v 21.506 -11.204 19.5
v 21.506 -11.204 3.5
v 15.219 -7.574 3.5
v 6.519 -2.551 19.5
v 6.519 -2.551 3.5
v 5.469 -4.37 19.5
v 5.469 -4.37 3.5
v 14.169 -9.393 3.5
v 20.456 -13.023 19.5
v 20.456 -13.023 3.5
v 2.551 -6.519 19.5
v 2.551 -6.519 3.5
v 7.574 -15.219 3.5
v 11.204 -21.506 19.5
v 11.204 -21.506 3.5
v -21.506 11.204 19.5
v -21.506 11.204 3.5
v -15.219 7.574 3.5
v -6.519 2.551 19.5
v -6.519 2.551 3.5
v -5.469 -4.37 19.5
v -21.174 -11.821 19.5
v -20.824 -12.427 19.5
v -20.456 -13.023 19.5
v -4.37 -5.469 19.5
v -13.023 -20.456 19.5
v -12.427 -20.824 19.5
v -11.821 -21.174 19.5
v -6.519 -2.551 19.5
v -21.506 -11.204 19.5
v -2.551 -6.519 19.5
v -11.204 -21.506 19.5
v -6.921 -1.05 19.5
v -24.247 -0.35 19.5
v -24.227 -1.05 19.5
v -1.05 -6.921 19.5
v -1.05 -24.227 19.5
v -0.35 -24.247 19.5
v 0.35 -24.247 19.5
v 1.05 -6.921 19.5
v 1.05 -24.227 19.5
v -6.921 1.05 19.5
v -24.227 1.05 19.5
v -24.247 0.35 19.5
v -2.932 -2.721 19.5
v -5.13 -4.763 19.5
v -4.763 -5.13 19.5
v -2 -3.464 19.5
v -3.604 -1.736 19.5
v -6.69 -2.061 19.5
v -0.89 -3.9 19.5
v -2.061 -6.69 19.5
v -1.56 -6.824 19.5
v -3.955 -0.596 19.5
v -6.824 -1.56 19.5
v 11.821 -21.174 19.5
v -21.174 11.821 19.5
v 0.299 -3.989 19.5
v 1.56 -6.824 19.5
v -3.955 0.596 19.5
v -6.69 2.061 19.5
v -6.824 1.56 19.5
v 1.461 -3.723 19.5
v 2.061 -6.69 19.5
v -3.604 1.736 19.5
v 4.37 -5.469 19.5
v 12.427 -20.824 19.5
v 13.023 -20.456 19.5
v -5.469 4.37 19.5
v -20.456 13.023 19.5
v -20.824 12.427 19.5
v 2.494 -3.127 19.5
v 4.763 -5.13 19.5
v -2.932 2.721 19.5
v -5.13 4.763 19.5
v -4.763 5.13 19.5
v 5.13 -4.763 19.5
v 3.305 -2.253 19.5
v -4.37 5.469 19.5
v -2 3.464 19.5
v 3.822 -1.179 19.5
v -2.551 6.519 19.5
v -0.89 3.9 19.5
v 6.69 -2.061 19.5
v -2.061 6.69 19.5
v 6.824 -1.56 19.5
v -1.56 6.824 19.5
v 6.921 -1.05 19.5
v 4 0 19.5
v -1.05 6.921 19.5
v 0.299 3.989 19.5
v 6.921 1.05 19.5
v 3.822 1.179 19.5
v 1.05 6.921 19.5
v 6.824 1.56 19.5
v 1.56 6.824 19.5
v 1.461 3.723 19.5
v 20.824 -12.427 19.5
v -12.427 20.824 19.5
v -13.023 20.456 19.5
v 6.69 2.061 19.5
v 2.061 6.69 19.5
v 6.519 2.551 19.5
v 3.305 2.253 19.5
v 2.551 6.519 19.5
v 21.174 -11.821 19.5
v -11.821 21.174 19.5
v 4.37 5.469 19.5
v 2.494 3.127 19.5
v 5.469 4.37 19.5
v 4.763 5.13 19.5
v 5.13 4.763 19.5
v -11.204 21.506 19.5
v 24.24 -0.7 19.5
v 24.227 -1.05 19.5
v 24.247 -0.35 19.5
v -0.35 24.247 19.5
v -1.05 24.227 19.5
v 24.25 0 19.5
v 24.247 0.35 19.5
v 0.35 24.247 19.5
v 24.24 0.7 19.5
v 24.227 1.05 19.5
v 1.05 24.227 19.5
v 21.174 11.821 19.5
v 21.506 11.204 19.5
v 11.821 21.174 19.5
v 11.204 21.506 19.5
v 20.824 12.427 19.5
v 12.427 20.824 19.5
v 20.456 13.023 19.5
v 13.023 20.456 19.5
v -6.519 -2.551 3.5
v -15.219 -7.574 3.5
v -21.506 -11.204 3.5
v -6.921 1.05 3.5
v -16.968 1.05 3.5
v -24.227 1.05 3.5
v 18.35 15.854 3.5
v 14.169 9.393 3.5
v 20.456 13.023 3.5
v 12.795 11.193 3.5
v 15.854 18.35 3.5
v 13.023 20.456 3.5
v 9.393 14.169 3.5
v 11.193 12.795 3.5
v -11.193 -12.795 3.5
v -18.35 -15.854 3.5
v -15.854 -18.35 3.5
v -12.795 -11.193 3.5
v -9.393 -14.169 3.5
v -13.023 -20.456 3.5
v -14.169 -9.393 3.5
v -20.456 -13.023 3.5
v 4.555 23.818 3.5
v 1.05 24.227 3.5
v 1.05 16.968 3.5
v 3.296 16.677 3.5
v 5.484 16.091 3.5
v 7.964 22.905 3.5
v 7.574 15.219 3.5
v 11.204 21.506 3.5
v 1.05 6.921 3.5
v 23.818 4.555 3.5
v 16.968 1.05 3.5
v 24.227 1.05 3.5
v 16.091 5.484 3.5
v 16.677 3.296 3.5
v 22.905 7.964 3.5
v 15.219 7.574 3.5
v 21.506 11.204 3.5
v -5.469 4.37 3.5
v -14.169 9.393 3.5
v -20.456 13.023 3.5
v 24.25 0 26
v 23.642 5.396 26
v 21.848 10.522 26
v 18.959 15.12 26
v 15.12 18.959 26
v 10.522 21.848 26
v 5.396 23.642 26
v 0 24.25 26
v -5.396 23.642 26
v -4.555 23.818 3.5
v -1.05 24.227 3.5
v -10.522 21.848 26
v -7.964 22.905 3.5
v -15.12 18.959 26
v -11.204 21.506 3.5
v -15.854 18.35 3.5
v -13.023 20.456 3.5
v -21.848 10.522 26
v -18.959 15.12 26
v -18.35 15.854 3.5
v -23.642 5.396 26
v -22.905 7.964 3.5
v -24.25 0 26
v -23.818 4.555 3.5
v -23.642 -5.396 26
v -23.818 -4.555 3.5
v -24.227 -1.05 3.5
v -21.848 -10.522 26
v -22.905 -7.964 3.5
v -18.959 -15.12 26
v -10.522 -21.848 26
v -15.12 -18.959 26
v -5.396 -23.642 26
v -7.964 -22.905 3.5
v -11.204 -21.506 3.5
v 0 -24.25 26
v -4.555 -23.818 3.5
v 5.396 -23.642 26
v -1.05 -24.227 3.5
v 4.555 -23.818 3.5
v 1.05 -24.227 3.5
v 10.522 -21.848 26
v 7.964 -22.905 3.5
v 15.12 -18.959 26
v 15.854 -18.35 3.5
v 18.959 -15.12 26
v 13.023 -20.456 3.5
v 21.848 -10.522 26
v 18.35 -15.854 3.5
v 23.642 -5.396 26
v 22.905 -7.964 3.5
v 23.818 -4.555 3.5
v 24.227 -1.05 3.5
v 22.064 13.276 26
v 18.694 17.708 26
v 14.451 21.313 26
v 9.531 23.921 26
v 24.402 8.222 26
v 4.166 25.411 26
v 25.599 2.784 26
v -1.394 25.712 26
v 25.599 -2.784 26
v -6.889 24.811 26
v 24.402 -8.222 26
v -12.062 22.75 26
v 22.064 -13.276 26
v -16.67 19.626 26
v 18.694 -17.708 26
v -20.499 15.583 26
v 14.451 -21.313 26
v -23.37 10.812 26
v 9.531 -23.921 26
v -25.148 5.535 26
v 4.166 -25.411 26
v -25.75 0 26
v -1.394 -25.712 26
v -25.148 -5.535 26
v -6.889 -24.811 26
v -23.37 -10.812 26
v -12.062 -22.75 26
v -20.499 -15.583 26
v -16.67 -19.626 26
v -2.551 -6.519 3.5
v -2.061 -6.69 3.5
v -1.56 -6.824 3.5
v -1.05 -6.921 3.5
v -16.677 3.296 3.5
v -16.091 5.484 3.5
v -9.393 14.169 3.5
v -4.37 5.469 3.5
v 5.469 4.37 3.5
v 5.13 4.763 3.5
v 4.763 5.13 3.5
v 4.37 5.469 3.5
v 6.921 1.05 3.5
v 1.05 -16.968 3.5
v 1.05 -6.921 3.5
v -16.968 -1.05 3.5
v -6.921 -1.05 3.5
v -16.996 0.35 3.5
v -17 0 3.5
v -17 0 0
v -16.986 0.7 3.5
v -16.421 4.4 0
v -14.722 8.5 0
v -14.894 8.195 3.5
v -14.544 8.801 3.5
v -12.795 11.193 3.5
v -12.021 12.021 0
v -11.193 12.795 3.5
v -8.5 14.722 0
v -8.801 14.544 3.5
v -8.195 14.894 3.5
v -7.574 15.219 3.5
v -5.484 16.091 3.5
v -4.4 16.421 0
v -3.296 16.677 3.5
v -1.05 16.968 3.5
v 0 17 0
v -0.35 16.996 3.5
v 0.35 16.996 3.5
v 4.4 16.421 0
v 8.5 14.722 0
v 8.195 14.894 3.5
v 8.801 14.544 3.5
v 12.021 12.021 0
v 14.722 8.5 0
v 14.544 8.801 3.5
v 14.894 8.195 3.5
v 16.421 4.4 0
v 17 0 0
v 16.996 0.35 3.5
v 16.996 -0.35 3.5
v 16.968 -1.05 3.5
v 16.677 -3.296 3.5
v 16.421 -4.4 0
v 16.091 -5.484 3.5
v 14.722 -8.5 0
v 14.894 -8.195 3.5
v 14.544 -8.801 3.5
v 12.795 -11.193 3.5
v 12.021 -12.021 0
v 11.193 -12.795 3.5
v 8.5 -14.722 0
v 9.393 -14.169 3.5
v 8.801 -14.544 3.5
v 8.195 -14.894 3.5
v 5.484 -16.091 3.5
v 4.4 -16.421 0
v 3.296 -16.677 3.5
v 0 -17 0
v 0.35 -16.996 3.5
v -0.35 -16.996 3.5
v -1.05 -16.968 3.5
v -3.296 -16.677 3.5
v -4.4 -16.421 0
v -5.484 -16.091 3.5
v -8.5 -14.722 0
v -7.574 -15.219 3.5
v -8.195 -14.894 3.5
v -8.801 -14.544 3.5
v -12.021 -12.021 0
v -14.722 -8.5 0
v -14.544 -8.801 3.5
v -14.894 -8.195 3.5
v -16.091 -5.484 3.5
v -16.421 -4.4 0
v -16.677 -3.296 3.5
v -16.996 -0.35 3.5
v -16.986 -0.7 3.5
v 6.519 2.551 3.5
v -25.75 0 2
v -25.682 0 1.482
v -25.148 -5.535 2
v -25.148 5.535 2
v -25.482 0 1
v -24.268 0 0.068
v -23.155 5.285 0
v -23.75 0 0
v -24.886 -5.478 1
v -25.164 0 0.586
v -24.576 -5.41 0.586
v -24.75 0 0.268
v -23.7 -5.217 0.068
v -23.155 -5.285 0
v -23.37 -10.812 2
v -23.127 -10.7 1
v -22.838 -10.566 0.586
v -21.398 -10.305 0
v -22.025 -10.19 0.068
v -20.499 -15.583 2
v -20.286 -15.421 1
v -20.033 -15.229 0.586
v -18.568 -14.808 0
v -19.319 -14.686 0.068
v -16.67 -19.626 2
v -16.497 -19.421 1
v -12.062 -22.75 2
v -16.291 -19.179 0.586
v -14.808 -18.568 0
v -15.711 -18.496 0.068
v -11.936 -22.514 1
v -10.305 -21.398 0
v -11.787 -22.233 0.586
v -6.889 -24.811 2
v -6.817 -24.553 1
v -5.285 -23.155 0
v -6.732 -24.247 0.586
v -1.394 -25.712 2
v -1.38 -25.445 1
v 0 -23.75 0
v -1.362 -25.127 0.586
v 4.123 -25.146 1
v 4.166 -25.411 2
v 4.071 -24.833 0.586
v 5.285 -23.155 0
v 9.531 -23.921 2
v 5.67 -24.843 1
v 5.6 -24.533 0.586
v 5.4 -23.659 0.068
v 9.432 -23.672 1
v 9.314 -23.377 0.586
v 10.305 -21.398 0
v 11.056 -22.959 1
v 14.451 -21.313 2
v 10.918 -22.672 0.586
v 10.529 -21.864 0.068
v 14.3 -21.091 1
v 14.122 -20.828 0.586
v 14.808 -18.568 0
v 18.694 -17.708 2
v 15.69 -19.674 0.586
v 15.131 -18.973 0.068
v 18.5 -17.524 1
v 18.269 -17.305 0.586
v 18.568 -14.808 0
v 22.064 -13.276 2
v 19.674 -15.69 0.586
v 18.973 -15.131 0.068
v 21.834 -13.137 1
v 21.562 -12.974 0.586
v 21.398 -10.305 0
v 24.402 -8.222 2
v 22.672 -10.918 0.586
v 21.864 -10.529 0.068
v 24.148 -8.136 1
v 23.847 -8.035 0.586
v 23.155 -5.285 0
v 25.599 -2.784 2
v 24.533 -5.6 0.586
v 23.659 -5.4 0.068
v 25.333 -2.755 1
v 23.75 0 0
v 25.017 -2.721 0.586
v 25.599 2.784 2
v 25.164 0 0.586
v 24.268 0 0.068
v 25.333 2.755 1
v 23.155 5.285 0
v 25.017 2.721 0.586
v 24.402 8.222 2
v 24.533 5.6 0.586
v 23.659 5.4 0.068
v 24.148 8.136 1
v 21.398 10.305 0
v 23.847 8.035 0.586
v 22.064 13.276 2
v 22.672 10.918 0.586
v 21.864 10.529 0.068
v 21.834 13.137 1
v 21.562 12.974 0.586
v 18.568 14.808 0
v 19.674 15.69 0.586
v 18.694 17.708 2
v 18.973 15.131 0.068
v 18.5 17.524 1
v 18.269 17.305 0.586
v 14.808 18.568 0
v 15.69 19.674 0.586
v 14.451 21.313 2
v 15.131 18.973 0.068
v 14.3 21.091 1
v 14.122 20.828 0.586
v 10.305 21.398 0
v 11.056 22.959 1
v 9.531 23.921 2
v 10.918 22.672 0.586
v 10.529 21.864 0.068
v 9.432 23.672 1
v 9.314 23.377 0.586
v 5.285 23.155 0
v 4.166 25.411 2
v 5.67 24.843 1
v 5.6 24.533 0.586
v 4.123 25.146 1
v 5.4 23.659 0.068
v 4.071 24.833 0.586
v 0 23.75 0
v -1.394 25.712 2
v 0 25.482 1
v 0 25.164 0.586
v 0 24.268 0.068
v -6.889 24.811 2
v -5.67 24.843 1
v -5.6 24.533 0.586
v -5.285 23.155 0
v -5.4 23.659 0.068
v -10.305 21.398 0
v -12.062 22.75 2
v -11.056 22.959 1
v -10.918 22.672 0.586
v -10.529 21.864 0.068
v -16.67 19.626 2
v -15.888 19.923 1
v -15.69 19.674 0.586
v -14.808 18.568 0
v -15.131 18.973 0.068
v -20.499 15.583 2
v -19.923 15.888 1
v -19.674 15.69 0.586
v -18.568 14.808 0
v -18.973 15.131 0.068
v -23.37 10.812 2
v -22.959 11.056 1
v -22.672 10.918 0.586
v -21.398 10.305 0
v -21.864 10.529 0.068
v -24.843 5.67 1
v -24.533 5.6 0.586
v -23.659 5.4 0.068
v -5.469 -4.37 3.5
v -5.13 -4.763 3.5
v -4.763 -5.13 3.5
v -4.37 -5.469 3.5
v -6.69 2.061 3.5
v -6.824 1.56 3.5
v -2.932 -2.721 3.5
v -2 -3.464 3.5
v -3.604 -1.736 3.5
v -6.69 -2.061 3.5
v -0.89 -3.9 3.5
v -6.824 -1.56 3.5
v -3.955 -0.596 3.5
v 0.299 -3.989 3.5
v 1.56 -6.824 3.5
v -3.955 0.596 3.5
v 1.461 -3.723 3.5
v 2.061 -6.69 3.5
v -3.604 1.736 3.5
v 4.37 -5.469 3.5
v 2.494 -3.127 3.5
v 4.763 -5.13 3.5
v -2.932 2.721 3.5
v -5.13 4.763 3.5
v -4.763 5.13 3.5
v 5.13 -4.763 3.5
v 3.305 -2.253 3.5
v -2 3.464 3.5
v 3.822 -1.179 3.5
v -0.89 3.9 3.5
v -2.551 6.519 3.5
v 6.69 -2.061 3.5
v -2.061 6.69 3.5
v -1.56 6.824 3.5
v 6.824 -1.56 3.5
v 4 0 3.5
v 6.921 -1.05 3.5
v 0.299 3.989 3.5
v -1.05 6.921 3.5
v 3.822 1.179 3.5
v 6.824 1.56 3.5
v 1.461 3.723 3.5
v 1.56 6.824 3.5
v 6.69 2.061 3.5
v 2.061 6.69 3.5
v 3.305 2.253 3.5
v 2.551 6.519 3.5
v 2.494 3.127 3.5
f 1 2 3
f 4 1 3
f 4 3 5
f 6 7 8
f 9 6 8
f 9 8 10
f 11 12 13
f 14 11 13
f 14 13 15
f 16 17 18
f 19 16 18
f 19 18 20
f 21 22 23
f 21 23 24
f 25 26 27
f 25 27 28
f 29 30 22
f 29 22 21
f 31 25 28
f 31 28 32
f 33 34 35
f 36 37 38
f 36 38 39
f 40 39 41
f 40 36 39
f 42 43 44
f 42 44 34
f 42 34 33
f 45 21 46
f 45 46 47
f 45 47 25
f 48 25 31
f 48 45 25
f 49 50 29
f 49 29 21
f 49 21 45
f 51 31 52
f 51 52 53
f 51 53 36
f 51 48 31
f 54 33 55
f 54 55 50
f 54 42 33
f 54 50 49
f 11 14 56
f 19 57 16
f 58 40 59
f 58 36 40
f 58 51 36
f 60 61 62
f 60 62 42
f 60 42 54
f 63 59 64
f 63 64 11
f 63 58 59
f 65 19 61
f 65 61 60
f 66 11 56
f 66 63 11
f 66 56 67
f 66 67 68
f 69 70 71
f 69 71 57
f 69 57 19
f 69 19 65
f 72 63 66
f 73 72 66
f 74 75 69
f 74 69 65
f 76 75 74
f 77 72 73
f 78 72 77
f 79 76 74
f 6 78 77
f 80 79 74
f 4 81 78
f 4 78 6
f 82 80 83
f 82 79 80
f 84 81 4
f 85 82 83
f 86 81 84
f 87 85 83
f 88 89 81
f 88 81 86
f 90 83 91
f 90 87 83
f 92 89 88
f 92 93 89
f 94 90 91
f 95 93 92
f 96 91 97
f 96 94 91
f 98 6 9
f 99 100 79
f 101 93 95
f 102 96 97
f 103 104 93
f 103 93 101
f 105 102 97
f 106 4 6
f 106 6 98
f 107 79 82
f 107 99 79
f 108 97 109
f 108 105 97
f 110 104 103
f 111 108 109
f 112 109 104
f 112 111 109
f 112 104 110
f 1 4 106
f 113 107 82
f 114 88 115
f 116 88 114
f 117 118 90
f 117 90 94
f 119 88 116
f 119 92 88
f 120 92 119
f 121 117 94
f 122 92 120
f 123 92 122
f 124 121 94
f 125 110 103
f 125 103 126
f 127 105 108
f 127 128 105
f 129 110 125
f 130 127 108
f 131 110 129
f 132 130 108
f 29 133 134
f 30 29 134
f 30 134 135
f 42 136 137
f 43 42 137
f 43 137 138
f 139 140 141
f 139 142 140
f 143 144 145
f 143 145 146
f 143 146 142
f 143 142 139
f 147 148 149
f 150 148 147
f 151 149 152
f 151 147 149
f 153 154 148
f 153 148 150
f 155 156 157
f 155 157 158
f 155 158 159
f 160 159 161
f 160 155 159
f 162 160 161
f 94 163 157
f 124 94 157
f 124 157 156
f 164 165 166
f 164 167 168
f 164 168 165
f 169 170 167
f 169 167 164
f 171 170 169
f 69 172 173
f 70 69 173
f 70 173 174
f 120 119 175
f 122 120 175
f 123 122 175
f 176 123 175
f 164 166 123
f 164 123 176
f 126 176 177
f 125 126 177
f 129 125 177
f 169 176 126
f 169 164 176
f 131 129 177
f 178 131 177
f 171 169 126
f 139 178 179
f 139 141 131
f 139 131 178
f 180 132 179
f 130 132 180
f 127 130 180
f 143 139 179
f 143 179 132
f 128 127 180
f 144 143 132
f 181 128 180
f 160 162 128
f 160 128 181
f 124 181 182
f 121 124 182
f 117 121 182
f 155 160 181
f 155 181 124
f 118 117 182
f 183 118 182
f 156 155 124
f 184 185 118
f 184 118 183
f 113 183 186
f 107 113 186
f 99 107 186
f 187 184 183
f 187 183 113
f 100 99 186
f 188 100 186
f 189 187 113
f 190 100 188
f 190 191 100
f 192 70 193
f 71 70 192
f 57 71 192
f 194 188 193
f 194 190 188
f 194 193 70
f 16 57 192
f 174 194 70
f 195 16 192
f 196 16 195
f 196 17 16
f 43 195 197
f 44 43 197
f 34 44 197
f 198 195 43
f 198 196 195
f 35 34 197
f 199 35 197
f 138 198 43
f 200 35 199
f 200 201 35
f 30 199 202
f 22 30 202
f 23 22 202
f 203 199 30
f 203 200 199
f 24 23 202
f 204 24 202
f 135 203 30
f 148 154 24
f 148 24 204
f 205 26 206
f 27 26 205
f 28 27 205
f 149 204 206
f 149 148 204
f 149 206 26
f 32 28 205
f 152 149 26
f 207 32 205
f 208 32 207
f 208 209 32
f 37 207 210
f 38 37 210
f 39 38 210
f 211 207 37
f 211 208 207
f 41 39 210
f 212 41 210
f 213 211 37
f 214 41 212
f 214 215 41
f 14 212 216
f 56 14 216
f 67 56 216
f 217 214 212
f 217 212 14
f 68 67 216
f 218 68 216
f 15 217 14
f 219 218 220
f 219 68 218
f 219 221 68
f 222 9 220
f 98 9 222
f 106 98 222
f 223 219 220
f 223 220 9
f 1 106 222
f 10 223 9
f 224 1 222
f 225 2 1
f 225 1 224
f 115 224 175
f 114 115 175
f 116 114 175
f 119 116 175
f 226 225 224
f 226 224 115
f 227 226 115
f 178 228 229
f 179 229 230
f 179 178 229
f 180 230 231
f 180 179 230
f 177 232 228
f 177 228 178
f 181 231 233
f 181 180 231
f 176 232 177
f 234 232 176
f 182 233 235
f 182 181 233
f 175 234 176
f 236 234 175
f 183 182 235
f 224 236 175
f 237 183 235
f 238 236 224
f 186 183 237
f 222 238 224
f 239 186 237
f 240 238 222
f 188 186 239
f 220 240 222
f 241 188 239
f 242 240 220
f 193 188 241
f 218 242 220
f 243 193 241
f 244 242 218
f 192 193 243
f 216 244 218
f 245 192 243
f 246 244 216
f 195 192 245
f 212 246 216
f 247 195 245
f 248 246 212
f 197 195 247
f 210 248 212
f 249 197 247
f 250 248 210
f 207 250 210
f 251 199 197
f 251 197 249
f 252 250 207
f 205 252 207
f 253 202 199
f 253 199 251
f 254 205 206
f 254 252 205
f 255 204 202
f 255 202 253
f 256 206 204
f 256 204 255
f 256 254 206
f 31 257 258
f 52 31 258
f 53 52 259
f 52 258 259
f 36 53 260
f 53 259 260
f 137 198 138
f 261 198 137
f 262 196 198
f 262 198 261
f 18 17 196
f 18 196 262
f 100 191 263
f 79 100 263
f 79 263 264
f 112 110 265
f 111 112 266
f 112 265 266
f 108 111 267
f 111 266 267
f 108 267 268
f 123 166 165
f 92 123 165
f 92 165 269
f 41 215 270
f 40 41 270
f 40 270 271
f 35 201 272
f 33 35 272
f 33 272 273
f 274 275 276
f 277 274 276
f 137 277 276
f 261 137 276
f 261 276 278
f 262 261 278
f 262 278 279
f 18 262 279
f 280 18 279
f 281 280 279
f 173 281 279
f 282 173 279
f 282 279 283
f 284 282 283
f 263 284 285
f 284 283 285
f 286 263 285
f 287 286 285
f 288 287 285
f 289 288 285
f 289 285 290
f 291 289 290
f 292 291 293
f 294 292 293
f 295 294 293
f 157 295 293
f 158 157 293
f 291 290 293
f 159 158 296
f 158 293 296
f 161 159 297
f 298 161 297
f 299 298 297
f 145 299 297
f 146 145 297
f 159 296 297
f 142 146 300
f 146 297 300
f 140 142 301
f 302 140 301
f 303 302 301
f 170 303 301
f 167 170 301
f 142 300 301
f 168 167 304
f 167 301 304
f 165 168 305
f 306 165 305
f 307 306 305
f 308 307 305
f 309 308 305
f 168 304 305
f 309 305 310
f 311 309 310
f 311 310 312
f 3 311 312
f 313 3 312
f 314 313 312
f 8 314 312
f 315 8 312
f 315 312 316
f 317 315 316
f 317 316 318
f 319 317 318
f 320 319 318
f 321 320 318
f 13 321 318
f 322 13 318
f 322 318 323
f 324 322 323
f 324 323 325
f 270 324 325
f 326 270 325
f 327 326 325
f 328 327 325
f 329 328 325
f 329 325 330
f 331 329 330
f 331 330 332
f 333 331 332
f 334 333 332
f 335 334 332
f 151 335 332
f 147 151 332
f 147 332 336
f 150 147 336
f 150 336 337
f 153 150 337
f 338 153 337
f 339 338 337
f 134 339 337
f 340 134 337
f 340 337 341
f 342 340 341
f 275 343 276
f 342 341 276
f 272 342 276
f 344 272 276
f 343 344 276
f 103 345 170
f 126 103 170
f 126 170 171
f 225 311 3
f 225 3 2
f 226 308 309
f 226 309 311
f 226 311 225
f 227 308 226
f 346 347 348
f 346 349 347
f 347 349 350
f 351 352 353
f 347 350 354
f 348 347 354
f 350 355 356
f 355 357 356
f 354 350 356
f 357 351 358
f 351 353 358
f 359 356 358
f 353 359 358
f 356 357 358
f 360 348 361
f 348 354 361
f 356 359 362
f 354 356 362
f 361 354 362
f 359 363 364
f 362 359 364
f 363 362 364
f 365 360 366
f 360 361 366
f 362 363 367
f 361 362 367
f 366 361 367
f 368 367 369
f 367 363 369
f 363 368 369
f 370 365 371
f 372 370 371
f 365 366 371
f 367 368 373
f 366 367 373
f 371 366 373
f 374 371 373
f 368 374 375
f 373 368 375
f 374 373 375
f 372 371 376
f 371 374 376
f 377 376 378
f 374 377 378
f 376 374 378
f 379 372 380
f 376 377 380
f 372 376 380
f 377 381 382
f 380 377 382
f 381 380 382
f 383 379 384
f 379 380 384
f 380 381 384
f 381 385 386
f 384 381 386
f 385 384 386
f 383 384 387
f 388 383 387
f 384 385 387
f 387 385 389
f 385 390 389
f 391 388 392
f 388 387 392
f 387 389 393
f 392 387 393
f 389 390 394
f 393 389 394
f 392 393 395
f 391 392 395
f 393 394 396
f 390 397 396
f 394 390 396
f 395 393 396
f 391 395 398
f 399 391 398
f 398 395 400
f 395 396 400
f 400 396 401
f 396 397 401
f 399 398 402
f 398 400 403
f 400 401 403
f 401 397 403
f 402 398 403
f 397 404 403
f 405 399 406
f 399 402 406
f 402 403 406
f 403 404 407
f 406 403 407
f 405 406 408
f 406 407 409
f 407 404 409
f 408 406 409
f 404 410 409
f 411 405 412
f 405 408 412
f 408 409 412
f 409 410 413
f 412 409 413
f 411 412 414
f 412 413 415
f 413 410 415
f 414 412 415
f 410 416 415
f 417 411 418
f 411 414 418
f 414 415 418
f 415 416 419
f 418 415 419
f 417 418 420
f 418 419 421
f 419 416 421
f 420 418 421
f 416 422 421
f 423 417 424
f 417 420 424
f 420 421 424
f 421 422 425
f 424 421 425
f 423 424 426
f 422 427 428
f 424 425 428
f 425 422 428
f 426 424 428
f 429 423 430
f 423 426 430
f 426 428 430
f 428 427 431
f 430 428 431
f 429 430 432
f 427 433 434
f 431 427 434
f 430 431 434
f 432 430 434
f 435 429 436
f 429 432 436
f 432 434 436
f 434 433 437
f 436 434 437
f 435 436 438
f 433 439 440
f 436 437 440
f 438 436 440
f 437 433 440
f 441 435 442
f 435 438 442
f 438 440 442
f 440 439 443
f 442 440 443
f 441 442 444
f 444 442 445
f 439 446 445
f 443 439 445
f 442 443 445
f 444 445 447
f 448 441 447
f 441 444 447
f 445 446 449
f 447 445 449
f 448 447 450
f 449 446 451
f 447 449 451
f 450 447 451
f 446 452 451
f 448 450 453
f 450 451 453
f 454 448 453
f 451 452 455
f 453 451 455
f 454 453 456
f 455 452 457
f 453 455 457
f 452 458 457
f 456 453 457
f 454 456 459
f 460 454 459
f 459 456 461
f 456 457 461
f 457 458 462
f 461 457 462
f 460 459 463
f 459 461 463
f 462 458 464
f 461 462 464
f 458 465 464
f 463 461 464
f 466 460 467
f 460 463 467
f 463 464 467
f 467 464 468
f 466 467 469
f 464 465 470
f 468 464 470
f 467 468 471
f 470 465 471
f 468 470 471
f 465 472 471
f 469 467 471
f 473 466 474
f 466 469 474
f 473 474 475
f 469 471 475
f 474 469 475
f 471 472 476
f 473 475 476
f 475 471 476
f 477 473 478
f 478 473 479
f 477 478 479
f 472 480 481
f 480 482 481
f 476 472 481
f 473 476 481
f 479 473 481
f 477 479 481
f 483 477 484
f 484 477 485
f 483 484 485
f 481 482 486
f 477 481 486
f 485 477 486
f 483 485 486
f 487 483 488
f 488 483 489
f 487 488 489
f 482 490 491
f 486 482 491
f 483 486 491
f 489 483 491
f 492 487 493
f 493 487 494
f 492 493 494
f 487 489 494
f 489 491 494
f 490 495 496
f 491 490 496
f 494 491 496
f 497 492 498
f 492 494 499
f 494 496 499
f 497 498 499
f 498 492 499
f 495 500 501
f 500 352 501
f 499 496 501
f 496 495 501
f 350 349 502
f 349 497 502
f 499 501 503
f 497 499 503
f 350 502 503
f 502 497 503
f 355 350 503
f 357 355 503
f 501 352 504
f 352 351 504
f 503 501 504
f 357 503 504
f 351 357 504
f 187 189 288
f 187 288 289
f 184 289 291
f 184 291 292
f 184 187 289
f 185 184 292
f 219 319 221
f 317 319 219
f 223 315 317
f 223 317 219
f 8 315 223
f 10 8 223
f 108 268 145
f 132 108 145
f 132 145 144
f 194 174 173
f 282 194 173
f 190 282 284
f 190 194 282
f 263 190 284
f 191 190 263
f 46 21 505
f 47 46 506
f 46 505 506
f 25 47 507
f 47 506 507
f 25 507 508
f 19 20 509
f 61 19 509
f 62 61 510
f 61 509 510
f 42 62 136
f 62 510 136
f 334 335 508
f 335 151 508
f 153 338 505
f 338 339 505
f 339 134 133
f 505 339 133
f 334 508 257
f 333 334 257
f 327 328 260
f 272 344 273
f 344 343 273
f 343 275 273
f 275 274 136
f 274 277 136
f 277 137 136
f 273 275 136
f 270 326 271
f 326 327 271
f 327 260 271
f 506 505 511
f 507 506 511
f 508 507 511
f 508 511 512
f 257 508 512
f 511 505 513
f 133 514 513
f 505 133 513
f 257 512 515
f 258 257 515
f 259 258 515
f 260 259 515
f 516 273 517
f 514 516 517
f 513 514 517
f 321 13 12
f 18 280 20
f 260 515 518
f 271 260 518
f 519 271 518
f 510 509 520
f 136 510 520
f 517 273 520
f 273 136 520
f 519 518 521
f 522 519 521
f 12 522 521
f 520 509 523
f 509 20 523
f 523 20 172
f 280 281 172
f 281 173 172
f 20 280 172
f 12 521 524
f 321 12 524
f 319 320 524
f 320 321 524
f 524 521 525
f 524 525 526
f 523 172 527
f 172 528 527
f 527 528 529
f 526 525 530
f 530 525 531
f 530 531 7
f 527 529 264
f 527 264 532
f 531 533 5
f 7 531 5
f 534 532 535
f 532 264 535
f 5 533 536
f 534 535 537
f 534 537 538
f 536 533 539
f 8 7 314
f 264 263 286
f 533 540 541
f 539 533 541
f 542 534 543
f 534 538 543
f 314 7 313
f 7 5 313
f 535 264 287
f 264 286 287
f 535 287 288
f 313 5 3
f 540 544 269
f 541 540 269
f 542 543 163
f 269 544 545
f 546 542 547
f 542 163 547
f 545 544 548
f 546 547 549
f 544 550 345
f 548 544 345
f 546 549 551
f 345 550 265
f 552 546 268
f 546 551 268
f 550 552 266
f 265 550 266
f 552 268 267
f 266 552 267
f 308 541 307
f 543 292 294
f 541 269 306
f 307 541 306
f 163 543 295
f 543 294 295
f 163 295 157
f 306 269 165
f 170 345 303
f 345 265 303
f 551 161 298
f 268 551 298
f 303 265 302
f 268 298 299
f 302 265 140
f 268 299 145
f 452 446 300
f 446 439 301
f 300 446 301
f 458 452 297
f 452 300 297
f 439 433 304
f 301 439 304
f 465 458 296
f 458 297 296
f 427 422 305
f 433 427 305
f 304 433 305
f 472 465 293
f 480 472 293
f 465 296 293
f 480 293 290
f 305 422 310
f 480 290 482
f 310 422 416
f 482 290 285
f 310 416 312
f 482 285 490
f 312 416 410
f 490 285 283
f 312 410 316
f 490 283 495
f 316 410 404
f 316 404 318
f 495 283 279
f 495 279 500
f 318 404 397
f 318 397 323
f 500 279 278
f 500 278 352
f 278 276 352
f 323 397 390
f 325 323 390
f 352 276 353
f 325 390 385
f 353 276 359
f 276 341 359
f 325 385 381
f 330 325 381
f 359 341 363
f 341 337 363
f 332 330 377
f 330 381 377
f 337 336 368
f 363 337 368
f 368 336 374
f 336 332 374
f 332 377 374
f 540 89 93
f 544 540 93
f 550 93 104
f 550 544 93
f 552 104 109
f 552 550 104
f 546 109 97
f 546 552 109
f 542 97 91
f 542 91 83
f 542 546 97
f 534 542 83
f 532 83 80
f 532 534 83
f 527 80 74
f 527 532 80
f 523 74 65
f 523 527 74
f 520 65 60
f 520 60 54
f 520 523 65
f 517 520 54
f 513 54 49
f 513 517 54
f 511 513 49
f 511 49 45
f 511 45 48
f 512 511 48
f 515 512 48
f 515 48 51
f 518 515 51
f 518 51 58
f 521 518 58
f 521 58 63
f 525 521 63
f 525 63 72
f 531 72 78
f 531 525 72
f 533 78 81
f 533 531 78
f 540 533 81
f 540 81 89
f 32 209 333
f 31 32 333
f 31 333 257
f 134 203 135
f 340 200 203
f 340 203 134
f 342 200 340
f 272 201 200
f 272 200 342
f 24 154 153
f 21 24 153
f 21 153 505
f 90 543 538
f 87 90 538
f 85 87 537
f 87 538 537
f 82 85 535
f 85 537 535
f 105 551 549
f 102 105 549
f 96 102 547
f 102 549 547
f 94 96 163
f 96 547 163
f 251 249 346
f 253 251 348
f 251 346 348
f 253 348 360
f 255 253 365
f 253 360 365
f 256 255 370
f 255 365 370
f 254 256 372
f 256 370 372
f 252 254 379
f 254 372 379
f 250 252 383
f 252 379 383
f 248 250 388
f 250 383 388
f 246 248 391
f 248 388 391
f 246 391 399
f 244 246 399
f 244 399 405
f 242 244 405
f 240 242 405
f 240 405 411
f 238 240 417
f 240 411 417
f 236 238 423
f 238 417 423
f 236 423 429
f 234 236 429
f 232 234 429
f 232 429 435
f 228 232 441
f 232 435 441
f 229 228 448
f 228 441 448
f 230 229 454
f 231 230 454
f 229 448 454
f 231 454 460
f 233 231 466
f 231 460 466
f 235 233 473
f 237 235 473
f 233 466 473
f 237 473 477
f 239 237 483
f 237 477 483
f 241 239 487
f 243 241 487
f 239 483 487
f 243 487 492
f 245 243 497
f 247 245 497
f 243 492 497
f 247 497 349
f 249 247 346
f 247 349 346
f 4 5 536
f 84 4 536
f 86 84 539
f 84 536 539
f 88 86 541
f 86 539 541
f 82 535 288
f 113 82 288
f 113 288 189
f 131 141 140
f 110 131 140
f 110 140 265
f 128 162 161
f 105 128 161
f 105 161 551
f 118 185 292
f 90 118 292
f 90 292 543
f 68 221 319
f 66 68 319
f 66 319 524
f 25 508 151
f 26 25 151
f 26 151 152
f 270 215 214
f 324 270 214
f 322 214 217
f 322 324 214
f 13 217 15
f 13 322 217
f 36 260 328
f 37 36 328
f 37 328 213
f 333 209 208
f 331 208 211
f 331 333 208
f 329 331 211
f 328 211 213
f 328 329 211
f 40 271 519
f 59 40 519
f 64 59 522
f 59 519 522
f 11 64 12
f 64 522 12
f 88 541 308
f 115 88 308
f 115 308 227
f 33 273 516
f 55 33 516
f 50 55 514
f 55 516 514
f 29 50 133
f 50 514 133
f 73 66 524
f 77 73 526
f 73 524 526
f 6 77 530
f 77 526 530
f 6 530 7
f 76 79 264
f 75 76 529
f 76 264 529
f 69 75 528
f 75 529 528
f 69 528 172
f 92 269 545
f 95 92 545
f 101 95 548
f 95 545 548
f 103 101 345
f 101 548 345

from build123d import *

# Parameters (mm, degrees)
SKICA1_R                 = 25.75
P_IDAT_VYSUNUT_M1_DEPTH  = 26
SKO_EPINA1_START         = 3.5
SKO_EPINA1_OUTLINE_R     = 24.25
SKO_EPINA1_DEPTH         = 22.5
SKICA2_R                 = 17
ODEBRAT_VYSUNUT_M1_DEPTH = 45.745111465
ZAOBLIT1_R               = 2
SKICA3_R                 = 4
P_IDAT_VYSUNUT_M2_DEPTH  = 16


# Read off the part's stored shape, not the designer's step: Skořepina1
with BuildPart() as part:
    # Skica1 → Přidat vysunutím1 (new body)
    with BuildSketch(Plane.XY):
        with Locations(Location((0, 0, 0), (0, 0, 180))):
            Circle(SKICA1_R)
    extrude(amount=P_IDAT_VYSUNUT_M1_DEPTH)

    # Skořepina1 outline → Skořepina1 (cut)
    with BuildSketch(Plane.XY.offset(SKO_EPINA1_START)):
        Circle(SKO_EPINA1_OUTLINE_R)
    extrude(amount=SKO_EPINA1_DEPTH, mode=Mode.SUBTRACT)

    # Skica2 → Odebrat vysunutím1 (cut, through all)
    with BuildSketch(Plane(origin=(0, 0, 0), x_dir=(-1, 0, 0), z_dir=(0, 0, -1))):
        Circle(SKICA2_R)
    extrude(amount=-ODEBRAT_VYSUNUT_M1_DEPTH, mode=Mode.SUBTRACT)

    # Zaoblit1
    zaoblit1_edges = [part.edges().sort_by_distance(p)[0] for p in [
        (25.75, 0, 0),
    ]]
    fillet(zaoblit1_edges, radius=ZAOBLIT1_R)

    # Skica3 → Přidat vysunutím2 (add)
    with BuildSketch(Plane.XY.offset(3.5)):
        with BuildLine():
            Line((-1.05, 24.227257377), (-1.05, 6.920801977))
            ThreePointArc((-1.05, 6.920801977), (-1.811733316, 6.761480784), (-2.551074314, 6.518590326))
            Line((-2.551074314, 6.518590326), (-11.204302014, 21.506420352))
            ThreePointArc((-11.204302014, 21.506420352), (-12.125, 21.001116042), (-13.022955362, 20.456420352))
            Line((-13.022955362, 20.456420352), (-4.369727662, 5.468590326))
            ThreePointArc((-4.369727662, 5.468590326), (-4.949747468, 4.949747468), (-5.468590326, 4.369727662))
            Line((-5.468590326, 4.369727662), (-20.456420352, 13.022955362))
            ThreePointArc((-20.456420352, 13.022955362), (-21.001116042, 12.125), (-21.506420352, 11.204302014))
            Line((-21.506420352, 11.204302014), (-6.518590326, 2.551074314))
            ThreePointArc((-6.518590326, 2.551074314), (-6.761480784, 1.811733316), (-6.920801977, 1.05))
            Line((-6.920801977, 1.05), (-24.227257377, 1.05))
            ThreePointArc((-24.227257377, 1.05), (-24.25, 0), (-24.227257377, -1.05))
            Line((-24.227257377, -1.05), (-6.920801977, -1.05))
            ThreePointArc((-6.920801977, -1.05), (-6.761480784, -1.811733316), (-6.518590326, -2.551074314))
            Line((-6.518590326, -2.551074314), (-21.506420352, -11.204302014))
            ThreePointArc((-21.506420352, -11.204302014), (-21.001116042, -12.125), (-20.456420352, -13.022955362))
            Line((-20.456420352, -13.022955362), (-5.468590326, -4.369727662))
            ThreePointArc((-5.468590326, -4.369727662), (-4.949747468, -4.949747468), (-4.369727662, -5.468590326))
            Line((-4.369727662, -5.468590326), (-13.022955362, -20.456420352))
            ThreePointArc((-13.022955362, -20.456420352), (-12.125, -21.001116042), (-11.204302014, -21.506420352))
            Line((-11.204302014, -21.506420352), (-2.551074314, -6.518590326))
            ThreePointArc((-2.551074314, -6.518590326), (-1.811733316, -6.761480784), (-1.05, -6.920801977))
            Line((-1.05, -6.920801977), (-1.05, -24.227257377))
            ThreePointArc((-1.05, -24.227257377), (0, -24.25), (1.05, -24.227257377))
            Line((1.05, -24.227257377), (1.05, -6.920801977))
            ThreePointArc((1.05, -6.920801977), (1.811733316, -6.761480784), (2.551074314, -6.518590326))
            Line((2.551074314, -6.518590326), (11.204302014, -21.506420352))
            ThreePointArc((11.204302014, -21.506420352), (12.125, -21.001116042), (13.022955362, -20.456420352))
            Line((13.022955362, -20.456420352), (4.369727662, -5.468590326))
            ThreePointArc((4.369727662, -5.468590326), (4.949747468, -4.949747468), (5.468590326, -4.369727662))
            Line((5.468590326, -4.369727662), (20.456420352, -13.022955362))
            ThreePointArc((20.456420352, -13.022955362), (21.001116042, -12.125), (21.506420352, -11.204302014))
            Line((21.506420352, -11.204302014), (6.518590326, -2.551074314))
            ThreePointArc((6.518590326, -2.551074314), (6.761480784, -1.811733316), (6.920801977, -1.05))
            Line((6.920801977, -1.05), (24.227257377, -1.05))
            ThreePointArc((24.227257377, -1.05), (24.25, 0), (24.227257377, 1.05))
            Line((24.227257377, 1.05), (6.920801977, 1.05))
            ThreePointArc((6.920801977, 1.05), (6.761480784, 1.811733316), (6.518590326, 2.551074314))
            Line((6.518590326, 2.551074314), (21.506420352, 11.204302014))
            ThreePointArc((21.506420352, 11.204302014), (21.001116042, 12.125), (20.456420352, 13.022955362))
            Line((20.456420352, 13.022955362), (5.468590326, 4.369727662))
            ThreePointArc((5.468590326, 4.369727662), (4.949747468, 4.949747468), (4.369727662, 5.468590326))
            Line((4.369727662, 5.468590326), (13.022955362, 20.456420352))
            ThreePointArc((13.022955362, 20.456420352), (12.125, 21.001116042), (11.204302014, 21.506420352))
            Line((11.204302014, 21.506420352), (2.551074314, 6.518590326))
            ThreePointArc((2.551074314, 6.518590326), (1.811733316, 6.761480784), (1.05, 6.920801977))
            Line((1.05, 6.920801977), (1.05, 24.227257377))
            ThreePointArc((1.05, 24.227257377), (0, 24.25), (-1.05, 24.227257377))
        make_face()
        Circle(SKICA3_R, mode=Mode.SUBTRACT)
    extrude(amount=P_IDAT_VYSUNUT_M2_DEPTH)


solid = part.part
